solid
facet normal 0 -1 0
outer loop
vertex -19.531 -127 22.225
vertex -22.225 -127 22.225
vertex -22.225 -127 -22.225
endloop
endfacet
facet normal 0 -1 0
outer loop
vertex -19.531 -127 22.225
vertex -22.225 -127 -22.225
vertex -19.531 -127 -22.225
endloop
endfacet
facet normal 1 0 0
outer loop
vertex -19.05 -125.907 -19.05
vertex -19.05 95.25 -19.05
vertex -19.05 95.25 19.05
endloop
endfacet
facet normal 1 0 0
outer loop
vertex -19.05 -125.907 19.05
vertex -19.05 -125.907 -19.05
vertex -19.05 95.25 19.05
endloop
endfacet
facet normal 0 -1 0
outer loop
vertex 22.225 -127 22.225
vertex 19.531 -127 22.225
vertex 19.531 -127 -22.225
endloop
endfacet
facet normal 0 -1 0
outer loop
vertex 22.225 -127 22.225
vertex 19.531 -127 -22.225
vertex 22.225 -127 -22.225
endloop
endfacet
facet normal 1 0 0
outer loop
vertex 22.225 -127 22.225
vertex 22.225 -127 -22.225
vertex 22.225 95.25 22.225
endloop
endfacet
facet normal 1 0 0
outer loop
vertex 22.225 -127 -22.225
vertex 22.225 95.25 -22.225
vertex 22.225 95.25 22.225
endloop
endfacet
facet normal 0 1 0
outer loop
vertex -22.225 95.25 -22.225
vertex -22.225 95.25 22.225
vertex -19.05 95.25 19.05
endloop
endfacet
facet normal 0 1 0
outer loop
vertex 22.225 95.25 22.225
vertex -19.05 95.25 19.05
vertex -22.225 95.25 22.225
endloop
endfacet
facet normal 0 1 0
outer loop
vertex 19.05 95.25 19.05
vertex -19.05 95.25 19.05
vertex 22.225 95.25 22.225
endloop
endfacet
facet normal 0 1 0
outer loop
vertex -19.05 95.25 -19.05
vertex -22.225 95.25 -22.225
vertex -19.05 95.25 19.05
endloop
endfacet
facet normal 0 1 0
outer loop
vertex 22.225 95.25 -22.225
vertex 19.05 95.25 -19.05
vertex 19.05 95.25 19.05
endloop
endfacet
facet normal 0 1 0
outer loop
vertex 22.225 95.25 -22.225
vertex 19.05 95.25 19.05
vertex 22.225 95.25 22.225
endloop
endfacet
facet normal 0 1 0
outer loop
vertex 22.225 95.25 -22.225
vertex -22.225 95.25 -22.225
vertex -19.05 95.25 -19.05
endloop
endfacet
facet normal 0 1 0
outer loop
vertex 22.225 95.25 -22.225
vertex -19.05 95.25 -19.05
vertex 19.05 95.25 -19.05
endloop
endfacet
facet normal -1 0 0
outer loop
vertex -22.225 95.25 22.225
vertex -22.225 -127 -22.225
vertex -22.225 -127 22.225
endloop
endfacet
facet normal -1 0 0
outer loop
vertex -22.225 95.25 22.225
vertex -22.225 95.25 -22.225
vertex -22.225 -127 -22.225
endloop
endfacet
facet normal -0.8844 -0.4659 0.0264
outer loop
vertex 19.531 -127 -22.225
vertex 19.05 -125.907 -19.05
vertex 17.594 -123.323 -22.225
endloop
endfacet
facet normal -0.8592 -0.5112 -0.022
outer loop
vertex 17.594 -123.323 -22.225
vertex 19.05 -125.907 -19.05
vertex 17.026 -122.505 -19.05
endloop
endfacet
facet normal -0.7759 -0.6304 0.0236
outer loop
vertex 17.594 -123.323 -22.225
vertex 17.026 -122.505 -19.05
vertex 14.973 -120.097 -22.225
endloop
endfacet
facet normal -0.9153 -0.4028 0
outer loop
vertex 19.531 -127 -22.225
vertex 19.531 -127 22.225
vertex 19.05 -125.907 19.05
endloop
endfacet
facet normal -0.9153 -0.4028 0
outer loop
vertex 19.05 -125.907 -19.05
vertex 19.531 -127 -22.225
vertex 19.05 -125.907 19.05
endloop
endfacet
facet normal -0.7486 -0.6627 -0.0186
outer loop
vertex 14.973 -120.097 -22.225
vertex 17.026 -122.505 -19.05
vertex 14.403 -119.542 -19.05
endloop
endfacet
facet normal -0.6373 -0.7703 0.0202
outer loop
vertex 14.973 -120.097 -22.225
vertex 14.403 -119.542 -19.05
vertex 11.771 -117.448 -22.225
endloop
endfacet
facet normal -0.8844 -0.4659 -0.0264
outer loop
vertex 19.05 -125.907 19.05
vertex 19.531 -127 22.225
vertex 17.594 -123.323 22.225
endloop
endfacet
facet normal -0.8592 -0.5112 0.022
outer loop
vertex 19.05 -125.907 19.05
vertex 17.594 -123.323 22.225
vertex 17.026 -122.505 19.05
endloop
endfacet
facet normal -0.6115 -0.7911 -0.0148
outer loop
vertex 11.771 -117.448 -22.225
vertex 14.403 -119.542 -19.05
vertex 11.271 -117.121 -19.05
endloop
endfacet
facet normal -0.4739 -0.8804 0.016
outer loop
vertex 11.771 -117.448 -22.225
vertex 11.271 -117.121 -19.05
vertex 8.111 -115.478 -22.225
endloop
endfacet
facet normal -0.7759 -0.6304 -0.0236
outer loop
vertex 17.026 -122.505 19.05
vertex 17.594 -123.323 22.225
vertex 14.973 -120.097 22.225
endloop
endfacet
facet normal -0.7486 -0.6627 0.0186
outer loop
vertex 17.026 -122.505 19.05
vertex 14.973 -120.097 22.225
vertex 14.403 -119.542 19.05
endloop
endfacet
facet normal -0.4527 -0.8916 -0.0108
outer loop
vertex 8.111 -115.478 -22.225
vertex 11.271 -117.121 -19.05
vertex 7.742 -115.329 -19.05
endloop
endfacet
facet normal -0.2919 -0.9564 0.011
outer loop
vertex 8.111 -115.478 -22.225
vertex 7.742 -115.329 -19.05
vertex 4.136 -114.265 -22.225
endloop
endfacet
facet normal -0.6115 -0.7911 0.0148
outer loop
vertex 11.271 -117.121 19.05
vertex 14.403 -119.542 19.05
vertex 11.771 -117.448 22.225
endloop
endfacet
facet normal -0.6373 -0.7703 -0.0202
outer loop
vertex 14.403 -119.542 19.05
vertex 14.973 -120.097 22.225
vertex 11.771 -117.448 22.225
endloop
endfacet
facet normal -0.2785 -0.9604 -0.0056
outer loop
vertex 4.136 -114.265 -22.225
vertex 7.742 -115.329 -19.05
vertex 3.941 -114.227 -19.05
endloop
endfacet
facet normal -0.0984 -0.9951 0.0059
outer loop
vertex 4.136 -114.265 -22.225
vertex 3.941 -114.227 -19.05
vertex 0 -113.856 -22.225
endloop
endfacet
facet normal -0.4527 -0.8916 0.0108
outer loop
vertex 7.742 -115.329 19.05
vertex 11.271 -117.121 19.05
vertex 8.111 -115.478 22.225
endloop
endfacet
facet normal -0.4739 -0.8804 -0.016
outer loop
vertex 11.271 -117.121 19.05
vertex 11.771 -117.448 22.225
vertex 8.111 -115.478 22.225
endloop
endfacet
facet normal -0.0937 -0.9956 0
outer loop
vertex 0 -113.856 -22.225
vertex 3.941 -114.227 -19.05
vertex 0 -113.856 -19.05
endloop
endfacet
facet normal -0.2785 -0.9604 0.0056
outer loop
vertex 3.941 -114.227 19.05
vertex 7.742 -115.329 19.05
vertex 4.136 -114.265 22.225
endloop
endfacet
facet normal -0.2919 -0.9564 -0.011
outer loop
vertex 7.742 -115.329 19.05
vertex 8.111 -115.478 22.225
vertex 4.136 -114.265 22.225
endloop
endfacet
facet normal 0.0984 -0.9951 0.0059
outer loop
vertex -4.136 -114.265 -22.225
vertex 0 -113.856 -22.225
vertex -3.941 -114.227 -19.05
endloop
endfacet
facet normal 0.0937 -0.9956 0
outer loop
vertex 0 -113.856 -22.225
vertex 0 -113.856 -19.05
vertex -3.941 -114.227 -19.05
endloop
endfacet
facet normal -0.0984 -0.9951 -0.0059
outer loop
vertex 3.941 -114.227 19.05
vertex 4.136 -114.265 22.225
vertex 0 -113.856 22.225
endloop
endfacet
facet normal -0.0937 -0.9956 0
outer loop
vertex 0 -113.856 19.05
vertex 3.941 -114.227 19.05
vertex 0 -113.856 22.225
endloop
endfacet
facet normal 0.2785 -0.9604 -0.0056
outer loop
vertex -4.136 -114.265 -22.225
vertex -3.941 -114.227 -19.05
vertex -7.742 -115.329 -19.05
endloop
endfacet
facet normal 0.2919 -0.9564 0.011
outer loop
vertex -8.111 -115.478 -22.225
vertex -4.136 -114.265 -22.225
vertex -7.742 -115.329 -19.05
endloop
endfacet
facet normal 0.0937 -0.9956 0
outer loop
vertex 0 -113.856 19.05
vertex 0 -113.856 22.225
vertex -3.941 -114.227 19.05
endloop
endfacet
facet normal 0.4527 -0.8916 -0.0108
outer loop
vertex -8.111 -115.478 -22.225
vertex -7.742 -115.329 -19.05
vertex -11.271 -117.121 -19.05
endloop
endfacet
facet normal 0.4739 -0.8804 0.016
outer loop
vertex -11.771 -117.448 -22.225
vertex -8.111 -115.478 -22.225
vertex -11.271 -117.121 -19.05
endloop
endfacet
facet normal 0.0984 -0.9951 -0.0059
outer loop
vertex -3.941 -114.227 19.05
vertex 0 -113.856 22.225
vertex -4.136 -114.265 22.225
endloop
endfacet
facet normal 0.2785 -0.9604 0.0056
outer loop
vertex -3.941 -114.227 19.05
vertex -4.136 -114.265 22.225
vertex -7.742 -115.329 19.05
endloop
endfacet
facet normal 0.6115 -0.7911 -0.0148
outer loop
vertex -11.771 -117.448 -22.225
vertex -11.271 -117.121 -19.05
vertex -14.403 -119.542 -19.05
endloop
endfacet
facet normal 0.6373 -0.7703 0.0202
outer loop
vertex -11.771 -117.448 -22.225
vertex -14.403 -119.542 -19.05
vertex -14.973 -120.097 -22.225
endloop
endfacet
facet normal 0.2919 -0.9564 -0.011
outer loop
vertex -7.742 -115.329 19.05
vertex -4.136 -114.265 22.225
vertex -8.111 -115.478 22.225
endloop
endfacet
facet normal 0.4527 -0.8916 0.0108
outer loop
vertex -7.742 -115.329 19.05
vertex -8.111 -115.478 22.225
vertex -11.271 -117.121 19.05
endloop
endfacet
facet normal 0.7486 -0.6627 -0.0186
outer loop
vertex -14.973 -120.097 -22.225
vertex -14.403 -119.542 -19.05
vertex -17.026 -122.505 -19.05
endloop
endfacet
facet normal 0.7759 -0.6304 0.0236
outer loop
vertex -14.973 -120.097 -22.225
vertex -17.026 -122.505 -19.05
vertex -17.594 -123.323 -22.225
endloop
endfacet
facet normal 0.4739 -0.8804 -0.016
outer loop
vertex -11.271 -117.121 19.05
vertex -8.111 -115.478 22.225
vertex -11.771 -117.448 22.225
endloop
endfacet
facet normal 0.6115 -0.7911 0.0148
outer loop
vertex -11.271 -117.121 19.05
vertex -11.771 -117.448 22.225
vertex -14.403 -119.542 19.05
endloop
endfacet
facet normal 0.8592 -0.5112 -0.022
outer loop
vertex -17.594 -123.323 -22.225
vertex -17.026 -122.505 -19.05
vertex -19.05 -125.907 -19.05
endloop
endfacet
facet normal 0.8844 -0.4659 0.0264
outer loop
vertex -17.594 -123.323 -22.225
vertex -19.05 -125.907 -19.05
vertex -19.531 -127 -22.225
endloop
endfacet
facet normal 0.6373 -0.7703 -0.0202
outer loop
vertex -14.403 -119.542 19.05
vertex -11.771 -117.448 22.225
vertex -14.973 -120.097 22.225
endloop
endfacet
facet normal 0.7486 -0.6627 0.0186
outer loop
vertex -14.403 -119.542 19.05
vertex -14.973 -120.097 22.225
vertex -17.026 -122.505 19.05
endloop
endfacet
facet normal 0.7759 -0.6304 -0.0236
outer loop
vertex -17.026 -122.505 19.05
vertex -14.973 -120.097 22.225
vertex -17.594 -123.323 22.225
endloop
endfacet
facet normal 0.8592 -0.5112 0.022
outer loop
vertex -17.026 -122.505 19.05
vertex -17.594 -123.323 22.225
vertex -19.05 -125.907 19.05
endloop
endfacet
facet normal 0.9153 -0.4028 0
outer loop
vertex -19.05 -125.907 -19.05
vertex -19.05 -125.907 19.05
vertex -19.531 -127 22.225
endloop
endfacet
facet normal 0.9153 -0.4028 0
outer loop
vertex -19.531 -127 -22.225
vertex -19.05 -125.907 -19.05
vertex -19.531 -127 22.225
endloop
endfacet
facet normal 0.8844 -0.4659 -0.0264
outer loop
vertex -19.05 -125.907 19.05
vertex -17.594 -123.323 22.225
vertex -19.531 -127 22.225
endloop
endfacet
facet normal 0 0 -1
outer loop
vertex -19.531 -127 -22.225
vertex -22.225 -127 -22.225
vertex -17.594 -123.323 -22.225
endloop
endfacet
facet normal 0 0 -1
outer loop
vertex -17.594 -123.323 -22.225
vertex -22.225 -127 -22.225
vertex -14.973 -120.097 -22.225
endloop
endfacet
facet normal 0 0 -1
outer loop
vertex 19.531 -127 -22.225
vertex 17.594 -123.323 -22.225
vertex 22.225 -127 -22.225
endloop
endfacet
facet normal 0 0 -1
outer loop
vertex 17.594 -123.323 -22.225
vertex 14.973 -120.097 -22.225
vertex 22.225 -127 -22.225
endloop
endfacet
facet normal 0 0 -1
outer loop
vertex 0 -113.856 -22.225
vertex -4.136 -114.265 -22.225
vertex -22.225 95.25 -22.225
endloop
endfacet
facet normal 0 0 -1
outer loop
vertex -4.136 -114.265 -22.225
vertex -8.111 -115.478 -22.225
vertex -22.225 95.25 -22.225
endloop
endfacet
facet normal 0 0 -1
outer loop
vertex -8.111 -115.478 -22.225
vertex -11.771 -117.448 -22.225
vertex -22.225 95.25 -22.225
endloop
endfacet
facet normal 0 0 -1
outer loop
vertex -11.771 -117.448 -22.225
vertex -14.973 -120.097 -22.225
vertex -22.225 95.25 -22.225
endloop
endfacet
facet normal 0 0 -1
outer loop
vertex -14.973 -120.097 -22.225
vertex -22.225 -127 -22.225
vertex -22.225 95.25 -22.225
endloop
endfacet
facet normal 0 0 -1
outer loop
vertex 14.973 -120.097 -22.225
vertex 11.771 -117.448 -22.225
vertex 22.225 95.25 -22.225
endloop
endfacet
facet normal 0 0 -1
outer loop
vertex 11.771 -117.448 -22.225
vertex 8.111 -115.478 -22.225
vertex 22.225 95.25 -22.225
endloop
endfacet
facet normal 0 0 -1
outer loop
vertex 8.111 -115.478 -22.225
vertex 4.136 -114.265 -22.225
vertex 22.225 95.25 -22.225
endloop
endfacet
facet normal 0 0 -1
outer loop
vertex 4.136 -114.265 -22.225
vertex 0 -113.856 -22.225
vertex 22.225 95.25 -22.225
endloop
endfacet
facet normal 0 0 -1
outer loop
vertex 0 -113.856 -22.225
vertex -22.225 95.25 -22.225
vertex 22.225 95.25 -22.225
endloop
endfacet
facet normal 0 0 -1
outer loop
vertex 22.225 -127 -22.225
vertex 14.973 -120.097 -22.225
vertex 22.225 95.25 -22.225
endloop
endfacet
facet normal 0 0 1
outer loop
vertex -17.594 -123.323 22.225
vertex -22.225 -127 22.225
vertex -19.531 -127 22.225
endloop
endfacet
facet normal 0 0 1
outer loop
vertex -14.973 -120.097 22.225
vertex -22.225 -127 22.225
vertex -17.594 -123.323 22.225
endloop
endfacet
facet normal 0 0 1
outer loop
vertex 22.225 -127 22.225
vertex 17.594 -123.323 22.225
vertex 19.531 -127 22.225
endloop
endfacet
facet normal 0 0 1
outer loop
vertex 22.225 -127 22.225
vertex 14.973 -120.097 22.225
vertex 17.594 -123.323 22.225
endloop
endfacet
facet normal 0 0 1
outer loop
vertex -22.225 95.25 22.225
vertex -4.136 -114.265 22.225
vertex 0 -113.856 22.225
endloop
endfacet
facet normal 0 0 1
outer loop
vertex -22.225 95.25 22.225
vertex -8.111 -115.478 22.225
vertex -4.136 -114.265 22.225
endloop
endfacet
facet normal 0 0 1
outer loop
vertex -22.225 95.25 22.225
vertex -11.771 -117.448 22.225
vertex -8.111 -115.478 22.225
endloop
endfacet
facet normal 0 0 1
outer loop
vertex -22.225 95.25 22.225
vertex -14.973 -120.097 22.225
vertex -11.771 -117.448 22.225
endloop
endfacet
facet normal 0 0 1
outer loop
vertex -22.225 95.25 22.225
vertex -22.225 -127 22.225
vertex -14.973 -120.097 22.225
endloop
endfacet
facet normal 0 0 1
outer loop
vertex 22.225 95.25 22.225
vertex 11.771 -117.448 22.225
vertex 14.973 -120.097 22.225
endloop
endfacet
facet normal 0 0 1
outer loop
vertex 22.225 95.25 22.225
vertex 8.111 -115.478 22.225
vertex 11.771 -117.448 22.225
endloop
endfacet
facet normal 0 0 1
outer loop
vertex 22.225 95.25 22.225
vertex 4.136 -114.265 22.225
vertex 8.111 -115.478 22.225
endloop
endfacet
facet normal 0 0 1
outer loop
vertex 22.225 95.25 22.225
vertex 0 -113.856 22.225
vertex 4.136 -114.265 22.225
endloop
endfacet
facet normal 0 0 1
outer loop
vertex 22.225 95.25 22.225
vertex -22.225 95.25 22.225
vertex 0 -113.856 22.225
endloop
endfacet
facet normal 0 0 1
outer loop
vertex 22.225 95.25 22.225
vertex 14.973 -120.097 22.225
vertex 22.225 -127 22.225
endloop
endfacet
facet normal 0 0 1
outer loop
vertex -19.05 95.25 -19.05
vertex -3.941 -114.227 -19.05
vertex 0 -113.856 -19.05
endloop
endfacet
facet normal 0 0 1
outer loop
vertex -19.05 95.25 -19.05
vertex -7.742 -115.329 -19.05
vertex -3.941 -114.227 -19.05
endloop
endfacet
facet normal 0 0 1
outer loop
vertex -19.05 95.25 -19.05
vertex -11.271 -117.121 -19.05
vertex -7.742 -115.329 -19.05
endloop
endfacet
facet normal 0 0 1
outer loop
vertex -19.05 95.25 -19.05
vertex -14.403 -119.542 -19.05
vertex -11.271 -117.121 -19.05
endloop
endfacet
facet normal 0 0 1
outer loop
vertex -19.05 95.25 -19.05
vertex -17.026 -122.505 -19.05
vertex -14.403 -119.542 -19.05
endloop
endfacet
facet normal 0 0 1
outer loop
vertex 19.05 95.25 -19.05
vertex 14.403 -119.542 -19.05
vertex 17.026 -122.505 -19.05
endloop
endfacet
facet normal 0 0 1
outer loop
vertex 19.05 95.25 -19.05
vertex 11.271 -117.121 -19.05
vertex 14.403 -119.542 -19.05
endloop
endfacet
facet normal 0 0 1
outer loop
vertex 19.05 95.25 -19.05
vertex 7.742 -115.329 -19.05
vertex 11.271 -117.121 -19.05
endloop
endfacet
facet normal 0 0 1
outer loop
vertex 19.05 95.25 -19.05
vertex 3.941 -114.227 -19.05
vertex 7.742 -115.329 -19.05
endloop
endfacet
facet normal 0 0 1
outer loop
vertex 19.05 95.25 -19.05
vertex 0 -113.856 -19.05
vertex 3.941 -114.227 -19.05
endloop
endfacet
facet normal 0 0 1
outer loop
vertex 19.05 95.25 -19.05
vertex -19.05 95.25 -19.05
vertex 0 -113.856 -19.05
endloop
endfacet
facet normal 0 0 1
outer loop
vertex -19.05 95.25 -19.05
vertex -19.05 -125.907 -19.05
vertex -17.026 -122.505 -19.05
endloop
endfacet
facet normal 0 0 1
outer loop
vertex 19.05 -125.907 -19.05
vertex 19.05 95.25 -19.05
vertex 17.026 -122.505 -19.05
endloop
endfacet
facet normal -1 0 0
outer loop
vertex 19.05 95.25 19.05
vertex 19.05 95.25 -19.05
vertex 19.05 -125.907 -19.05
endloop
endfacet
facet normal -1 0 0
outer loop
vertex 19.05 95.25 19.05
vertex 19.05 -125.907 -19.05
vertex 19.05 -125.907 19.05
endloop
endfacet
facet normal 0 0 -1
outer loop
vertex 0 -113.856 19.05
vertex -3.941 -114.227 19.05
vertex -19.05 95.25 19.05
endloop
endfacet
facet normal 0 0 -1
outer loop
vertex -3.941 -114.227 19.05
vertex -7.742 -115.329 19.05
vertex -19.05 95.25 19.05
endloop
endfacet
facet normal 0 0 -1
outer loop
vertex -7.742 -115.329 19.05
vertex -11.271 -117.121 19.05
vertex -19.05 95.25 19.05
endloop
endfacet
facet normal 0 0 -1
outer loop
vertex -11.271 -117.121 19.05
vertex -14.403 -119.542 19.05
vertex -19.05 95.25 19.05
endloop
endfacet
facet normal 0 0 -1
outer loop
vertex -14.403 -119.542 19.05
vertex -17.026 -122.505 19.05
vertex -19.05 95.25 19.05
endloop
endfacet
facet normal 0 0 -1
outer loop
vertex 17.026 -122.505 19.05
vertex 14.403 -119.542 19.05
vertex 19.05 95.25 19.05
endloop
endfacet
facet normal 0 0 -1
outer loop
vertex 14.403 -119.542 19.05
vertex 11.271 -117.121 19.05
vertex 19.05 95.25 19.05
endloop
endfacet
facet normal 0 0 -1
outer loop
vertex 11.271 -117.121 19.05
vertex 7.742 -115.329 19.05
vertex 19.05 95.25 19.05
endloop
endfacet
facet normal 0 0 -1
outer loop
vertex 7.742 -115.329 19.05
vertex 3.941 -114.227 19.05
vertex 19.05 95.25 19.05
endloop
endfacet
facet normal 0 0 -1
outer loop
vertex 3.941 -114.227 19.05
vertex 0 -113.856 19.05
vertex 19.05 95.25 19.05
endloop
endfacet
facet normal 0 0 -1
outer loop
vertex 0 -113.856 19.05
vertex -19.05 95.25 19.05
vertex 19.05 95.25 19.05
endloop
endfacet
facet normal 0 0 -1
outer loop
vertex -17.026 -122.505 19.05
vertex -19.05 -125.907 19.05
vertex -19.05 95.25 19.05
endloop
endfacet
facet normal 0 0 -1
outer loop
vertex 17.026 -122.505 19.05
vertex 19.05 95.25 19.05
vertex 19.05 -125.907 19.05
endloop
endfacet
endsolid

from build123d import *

# Parameters (mm, degrees)
BOSS_EXTRUDE1_DEPTH      = 95.25
BOSS_EXTRUDE1_DEPTH_BACK = 95.25
SKETCH1_W                = 44.45
SKETCH1_H                = 44.45
SKETCH1_W_2              = 38.1
SKETCH1_H_2              = 38.1
SKETCH2_W                = 44.45
SKETCH2_H                = 44.45
SKETCH2_W_2              = 38.1
SKETCH2_H_2              = 38.1
BOSS_EXTRUDE2_DEPTH      = 31.75
SKETCH3_R                = 21.082
CUT_EXTRUDE1_DEPTH       = 137.377245628


with BuildPart() as part:
    # Sketch1 → Boss-Extrude1 (new, two sides: drawn at the far end of the back side and taken through both)
    with BuildSketch(Plane(origin=(0, 0, 0), x_dir=(1, 0, 0), z_dir=(0, 1, 0)).offset(-BOSS_EXTRUDE1_DEPTH_BACK)):
        Rectangle(SKETCH1_W, SKETCH1_H)
        Rectangle(SKETCH1_W_2, SKETCH1_H_2, mode=Mode.SUBTRACT)
    extrude(amount=BOSS_EXTRUDE1_DEPTH + BOSS_EXTRUDE1_DEPTH_BACK)

    # Sketch2 → Boss-Extrude2 (add)
    with BuildSketch(Plane.XZ.offset(95.25)):
        Rectangle(SKETCH2_W, SKETCH2_H)
        Rectangle(SKETCH2_W_2, SKETCH2_H_2, mode=Mode.SUBTRACT)
    extrude(amount=BOSS_EXTRUDE2_DEPTH)

    # Sketch3 → Cut-Extrude1 (cut, through all)
    with BuildSketch(Plane.XY.offset(22.225)):
        with Locations((0, -134.9375)):
            Circle(SKETCH3_R)
    extrude(amount=-CUT_EXTRUDE1_DEPTH, mode=Mode.SUBTRACT)


solid = part.part
